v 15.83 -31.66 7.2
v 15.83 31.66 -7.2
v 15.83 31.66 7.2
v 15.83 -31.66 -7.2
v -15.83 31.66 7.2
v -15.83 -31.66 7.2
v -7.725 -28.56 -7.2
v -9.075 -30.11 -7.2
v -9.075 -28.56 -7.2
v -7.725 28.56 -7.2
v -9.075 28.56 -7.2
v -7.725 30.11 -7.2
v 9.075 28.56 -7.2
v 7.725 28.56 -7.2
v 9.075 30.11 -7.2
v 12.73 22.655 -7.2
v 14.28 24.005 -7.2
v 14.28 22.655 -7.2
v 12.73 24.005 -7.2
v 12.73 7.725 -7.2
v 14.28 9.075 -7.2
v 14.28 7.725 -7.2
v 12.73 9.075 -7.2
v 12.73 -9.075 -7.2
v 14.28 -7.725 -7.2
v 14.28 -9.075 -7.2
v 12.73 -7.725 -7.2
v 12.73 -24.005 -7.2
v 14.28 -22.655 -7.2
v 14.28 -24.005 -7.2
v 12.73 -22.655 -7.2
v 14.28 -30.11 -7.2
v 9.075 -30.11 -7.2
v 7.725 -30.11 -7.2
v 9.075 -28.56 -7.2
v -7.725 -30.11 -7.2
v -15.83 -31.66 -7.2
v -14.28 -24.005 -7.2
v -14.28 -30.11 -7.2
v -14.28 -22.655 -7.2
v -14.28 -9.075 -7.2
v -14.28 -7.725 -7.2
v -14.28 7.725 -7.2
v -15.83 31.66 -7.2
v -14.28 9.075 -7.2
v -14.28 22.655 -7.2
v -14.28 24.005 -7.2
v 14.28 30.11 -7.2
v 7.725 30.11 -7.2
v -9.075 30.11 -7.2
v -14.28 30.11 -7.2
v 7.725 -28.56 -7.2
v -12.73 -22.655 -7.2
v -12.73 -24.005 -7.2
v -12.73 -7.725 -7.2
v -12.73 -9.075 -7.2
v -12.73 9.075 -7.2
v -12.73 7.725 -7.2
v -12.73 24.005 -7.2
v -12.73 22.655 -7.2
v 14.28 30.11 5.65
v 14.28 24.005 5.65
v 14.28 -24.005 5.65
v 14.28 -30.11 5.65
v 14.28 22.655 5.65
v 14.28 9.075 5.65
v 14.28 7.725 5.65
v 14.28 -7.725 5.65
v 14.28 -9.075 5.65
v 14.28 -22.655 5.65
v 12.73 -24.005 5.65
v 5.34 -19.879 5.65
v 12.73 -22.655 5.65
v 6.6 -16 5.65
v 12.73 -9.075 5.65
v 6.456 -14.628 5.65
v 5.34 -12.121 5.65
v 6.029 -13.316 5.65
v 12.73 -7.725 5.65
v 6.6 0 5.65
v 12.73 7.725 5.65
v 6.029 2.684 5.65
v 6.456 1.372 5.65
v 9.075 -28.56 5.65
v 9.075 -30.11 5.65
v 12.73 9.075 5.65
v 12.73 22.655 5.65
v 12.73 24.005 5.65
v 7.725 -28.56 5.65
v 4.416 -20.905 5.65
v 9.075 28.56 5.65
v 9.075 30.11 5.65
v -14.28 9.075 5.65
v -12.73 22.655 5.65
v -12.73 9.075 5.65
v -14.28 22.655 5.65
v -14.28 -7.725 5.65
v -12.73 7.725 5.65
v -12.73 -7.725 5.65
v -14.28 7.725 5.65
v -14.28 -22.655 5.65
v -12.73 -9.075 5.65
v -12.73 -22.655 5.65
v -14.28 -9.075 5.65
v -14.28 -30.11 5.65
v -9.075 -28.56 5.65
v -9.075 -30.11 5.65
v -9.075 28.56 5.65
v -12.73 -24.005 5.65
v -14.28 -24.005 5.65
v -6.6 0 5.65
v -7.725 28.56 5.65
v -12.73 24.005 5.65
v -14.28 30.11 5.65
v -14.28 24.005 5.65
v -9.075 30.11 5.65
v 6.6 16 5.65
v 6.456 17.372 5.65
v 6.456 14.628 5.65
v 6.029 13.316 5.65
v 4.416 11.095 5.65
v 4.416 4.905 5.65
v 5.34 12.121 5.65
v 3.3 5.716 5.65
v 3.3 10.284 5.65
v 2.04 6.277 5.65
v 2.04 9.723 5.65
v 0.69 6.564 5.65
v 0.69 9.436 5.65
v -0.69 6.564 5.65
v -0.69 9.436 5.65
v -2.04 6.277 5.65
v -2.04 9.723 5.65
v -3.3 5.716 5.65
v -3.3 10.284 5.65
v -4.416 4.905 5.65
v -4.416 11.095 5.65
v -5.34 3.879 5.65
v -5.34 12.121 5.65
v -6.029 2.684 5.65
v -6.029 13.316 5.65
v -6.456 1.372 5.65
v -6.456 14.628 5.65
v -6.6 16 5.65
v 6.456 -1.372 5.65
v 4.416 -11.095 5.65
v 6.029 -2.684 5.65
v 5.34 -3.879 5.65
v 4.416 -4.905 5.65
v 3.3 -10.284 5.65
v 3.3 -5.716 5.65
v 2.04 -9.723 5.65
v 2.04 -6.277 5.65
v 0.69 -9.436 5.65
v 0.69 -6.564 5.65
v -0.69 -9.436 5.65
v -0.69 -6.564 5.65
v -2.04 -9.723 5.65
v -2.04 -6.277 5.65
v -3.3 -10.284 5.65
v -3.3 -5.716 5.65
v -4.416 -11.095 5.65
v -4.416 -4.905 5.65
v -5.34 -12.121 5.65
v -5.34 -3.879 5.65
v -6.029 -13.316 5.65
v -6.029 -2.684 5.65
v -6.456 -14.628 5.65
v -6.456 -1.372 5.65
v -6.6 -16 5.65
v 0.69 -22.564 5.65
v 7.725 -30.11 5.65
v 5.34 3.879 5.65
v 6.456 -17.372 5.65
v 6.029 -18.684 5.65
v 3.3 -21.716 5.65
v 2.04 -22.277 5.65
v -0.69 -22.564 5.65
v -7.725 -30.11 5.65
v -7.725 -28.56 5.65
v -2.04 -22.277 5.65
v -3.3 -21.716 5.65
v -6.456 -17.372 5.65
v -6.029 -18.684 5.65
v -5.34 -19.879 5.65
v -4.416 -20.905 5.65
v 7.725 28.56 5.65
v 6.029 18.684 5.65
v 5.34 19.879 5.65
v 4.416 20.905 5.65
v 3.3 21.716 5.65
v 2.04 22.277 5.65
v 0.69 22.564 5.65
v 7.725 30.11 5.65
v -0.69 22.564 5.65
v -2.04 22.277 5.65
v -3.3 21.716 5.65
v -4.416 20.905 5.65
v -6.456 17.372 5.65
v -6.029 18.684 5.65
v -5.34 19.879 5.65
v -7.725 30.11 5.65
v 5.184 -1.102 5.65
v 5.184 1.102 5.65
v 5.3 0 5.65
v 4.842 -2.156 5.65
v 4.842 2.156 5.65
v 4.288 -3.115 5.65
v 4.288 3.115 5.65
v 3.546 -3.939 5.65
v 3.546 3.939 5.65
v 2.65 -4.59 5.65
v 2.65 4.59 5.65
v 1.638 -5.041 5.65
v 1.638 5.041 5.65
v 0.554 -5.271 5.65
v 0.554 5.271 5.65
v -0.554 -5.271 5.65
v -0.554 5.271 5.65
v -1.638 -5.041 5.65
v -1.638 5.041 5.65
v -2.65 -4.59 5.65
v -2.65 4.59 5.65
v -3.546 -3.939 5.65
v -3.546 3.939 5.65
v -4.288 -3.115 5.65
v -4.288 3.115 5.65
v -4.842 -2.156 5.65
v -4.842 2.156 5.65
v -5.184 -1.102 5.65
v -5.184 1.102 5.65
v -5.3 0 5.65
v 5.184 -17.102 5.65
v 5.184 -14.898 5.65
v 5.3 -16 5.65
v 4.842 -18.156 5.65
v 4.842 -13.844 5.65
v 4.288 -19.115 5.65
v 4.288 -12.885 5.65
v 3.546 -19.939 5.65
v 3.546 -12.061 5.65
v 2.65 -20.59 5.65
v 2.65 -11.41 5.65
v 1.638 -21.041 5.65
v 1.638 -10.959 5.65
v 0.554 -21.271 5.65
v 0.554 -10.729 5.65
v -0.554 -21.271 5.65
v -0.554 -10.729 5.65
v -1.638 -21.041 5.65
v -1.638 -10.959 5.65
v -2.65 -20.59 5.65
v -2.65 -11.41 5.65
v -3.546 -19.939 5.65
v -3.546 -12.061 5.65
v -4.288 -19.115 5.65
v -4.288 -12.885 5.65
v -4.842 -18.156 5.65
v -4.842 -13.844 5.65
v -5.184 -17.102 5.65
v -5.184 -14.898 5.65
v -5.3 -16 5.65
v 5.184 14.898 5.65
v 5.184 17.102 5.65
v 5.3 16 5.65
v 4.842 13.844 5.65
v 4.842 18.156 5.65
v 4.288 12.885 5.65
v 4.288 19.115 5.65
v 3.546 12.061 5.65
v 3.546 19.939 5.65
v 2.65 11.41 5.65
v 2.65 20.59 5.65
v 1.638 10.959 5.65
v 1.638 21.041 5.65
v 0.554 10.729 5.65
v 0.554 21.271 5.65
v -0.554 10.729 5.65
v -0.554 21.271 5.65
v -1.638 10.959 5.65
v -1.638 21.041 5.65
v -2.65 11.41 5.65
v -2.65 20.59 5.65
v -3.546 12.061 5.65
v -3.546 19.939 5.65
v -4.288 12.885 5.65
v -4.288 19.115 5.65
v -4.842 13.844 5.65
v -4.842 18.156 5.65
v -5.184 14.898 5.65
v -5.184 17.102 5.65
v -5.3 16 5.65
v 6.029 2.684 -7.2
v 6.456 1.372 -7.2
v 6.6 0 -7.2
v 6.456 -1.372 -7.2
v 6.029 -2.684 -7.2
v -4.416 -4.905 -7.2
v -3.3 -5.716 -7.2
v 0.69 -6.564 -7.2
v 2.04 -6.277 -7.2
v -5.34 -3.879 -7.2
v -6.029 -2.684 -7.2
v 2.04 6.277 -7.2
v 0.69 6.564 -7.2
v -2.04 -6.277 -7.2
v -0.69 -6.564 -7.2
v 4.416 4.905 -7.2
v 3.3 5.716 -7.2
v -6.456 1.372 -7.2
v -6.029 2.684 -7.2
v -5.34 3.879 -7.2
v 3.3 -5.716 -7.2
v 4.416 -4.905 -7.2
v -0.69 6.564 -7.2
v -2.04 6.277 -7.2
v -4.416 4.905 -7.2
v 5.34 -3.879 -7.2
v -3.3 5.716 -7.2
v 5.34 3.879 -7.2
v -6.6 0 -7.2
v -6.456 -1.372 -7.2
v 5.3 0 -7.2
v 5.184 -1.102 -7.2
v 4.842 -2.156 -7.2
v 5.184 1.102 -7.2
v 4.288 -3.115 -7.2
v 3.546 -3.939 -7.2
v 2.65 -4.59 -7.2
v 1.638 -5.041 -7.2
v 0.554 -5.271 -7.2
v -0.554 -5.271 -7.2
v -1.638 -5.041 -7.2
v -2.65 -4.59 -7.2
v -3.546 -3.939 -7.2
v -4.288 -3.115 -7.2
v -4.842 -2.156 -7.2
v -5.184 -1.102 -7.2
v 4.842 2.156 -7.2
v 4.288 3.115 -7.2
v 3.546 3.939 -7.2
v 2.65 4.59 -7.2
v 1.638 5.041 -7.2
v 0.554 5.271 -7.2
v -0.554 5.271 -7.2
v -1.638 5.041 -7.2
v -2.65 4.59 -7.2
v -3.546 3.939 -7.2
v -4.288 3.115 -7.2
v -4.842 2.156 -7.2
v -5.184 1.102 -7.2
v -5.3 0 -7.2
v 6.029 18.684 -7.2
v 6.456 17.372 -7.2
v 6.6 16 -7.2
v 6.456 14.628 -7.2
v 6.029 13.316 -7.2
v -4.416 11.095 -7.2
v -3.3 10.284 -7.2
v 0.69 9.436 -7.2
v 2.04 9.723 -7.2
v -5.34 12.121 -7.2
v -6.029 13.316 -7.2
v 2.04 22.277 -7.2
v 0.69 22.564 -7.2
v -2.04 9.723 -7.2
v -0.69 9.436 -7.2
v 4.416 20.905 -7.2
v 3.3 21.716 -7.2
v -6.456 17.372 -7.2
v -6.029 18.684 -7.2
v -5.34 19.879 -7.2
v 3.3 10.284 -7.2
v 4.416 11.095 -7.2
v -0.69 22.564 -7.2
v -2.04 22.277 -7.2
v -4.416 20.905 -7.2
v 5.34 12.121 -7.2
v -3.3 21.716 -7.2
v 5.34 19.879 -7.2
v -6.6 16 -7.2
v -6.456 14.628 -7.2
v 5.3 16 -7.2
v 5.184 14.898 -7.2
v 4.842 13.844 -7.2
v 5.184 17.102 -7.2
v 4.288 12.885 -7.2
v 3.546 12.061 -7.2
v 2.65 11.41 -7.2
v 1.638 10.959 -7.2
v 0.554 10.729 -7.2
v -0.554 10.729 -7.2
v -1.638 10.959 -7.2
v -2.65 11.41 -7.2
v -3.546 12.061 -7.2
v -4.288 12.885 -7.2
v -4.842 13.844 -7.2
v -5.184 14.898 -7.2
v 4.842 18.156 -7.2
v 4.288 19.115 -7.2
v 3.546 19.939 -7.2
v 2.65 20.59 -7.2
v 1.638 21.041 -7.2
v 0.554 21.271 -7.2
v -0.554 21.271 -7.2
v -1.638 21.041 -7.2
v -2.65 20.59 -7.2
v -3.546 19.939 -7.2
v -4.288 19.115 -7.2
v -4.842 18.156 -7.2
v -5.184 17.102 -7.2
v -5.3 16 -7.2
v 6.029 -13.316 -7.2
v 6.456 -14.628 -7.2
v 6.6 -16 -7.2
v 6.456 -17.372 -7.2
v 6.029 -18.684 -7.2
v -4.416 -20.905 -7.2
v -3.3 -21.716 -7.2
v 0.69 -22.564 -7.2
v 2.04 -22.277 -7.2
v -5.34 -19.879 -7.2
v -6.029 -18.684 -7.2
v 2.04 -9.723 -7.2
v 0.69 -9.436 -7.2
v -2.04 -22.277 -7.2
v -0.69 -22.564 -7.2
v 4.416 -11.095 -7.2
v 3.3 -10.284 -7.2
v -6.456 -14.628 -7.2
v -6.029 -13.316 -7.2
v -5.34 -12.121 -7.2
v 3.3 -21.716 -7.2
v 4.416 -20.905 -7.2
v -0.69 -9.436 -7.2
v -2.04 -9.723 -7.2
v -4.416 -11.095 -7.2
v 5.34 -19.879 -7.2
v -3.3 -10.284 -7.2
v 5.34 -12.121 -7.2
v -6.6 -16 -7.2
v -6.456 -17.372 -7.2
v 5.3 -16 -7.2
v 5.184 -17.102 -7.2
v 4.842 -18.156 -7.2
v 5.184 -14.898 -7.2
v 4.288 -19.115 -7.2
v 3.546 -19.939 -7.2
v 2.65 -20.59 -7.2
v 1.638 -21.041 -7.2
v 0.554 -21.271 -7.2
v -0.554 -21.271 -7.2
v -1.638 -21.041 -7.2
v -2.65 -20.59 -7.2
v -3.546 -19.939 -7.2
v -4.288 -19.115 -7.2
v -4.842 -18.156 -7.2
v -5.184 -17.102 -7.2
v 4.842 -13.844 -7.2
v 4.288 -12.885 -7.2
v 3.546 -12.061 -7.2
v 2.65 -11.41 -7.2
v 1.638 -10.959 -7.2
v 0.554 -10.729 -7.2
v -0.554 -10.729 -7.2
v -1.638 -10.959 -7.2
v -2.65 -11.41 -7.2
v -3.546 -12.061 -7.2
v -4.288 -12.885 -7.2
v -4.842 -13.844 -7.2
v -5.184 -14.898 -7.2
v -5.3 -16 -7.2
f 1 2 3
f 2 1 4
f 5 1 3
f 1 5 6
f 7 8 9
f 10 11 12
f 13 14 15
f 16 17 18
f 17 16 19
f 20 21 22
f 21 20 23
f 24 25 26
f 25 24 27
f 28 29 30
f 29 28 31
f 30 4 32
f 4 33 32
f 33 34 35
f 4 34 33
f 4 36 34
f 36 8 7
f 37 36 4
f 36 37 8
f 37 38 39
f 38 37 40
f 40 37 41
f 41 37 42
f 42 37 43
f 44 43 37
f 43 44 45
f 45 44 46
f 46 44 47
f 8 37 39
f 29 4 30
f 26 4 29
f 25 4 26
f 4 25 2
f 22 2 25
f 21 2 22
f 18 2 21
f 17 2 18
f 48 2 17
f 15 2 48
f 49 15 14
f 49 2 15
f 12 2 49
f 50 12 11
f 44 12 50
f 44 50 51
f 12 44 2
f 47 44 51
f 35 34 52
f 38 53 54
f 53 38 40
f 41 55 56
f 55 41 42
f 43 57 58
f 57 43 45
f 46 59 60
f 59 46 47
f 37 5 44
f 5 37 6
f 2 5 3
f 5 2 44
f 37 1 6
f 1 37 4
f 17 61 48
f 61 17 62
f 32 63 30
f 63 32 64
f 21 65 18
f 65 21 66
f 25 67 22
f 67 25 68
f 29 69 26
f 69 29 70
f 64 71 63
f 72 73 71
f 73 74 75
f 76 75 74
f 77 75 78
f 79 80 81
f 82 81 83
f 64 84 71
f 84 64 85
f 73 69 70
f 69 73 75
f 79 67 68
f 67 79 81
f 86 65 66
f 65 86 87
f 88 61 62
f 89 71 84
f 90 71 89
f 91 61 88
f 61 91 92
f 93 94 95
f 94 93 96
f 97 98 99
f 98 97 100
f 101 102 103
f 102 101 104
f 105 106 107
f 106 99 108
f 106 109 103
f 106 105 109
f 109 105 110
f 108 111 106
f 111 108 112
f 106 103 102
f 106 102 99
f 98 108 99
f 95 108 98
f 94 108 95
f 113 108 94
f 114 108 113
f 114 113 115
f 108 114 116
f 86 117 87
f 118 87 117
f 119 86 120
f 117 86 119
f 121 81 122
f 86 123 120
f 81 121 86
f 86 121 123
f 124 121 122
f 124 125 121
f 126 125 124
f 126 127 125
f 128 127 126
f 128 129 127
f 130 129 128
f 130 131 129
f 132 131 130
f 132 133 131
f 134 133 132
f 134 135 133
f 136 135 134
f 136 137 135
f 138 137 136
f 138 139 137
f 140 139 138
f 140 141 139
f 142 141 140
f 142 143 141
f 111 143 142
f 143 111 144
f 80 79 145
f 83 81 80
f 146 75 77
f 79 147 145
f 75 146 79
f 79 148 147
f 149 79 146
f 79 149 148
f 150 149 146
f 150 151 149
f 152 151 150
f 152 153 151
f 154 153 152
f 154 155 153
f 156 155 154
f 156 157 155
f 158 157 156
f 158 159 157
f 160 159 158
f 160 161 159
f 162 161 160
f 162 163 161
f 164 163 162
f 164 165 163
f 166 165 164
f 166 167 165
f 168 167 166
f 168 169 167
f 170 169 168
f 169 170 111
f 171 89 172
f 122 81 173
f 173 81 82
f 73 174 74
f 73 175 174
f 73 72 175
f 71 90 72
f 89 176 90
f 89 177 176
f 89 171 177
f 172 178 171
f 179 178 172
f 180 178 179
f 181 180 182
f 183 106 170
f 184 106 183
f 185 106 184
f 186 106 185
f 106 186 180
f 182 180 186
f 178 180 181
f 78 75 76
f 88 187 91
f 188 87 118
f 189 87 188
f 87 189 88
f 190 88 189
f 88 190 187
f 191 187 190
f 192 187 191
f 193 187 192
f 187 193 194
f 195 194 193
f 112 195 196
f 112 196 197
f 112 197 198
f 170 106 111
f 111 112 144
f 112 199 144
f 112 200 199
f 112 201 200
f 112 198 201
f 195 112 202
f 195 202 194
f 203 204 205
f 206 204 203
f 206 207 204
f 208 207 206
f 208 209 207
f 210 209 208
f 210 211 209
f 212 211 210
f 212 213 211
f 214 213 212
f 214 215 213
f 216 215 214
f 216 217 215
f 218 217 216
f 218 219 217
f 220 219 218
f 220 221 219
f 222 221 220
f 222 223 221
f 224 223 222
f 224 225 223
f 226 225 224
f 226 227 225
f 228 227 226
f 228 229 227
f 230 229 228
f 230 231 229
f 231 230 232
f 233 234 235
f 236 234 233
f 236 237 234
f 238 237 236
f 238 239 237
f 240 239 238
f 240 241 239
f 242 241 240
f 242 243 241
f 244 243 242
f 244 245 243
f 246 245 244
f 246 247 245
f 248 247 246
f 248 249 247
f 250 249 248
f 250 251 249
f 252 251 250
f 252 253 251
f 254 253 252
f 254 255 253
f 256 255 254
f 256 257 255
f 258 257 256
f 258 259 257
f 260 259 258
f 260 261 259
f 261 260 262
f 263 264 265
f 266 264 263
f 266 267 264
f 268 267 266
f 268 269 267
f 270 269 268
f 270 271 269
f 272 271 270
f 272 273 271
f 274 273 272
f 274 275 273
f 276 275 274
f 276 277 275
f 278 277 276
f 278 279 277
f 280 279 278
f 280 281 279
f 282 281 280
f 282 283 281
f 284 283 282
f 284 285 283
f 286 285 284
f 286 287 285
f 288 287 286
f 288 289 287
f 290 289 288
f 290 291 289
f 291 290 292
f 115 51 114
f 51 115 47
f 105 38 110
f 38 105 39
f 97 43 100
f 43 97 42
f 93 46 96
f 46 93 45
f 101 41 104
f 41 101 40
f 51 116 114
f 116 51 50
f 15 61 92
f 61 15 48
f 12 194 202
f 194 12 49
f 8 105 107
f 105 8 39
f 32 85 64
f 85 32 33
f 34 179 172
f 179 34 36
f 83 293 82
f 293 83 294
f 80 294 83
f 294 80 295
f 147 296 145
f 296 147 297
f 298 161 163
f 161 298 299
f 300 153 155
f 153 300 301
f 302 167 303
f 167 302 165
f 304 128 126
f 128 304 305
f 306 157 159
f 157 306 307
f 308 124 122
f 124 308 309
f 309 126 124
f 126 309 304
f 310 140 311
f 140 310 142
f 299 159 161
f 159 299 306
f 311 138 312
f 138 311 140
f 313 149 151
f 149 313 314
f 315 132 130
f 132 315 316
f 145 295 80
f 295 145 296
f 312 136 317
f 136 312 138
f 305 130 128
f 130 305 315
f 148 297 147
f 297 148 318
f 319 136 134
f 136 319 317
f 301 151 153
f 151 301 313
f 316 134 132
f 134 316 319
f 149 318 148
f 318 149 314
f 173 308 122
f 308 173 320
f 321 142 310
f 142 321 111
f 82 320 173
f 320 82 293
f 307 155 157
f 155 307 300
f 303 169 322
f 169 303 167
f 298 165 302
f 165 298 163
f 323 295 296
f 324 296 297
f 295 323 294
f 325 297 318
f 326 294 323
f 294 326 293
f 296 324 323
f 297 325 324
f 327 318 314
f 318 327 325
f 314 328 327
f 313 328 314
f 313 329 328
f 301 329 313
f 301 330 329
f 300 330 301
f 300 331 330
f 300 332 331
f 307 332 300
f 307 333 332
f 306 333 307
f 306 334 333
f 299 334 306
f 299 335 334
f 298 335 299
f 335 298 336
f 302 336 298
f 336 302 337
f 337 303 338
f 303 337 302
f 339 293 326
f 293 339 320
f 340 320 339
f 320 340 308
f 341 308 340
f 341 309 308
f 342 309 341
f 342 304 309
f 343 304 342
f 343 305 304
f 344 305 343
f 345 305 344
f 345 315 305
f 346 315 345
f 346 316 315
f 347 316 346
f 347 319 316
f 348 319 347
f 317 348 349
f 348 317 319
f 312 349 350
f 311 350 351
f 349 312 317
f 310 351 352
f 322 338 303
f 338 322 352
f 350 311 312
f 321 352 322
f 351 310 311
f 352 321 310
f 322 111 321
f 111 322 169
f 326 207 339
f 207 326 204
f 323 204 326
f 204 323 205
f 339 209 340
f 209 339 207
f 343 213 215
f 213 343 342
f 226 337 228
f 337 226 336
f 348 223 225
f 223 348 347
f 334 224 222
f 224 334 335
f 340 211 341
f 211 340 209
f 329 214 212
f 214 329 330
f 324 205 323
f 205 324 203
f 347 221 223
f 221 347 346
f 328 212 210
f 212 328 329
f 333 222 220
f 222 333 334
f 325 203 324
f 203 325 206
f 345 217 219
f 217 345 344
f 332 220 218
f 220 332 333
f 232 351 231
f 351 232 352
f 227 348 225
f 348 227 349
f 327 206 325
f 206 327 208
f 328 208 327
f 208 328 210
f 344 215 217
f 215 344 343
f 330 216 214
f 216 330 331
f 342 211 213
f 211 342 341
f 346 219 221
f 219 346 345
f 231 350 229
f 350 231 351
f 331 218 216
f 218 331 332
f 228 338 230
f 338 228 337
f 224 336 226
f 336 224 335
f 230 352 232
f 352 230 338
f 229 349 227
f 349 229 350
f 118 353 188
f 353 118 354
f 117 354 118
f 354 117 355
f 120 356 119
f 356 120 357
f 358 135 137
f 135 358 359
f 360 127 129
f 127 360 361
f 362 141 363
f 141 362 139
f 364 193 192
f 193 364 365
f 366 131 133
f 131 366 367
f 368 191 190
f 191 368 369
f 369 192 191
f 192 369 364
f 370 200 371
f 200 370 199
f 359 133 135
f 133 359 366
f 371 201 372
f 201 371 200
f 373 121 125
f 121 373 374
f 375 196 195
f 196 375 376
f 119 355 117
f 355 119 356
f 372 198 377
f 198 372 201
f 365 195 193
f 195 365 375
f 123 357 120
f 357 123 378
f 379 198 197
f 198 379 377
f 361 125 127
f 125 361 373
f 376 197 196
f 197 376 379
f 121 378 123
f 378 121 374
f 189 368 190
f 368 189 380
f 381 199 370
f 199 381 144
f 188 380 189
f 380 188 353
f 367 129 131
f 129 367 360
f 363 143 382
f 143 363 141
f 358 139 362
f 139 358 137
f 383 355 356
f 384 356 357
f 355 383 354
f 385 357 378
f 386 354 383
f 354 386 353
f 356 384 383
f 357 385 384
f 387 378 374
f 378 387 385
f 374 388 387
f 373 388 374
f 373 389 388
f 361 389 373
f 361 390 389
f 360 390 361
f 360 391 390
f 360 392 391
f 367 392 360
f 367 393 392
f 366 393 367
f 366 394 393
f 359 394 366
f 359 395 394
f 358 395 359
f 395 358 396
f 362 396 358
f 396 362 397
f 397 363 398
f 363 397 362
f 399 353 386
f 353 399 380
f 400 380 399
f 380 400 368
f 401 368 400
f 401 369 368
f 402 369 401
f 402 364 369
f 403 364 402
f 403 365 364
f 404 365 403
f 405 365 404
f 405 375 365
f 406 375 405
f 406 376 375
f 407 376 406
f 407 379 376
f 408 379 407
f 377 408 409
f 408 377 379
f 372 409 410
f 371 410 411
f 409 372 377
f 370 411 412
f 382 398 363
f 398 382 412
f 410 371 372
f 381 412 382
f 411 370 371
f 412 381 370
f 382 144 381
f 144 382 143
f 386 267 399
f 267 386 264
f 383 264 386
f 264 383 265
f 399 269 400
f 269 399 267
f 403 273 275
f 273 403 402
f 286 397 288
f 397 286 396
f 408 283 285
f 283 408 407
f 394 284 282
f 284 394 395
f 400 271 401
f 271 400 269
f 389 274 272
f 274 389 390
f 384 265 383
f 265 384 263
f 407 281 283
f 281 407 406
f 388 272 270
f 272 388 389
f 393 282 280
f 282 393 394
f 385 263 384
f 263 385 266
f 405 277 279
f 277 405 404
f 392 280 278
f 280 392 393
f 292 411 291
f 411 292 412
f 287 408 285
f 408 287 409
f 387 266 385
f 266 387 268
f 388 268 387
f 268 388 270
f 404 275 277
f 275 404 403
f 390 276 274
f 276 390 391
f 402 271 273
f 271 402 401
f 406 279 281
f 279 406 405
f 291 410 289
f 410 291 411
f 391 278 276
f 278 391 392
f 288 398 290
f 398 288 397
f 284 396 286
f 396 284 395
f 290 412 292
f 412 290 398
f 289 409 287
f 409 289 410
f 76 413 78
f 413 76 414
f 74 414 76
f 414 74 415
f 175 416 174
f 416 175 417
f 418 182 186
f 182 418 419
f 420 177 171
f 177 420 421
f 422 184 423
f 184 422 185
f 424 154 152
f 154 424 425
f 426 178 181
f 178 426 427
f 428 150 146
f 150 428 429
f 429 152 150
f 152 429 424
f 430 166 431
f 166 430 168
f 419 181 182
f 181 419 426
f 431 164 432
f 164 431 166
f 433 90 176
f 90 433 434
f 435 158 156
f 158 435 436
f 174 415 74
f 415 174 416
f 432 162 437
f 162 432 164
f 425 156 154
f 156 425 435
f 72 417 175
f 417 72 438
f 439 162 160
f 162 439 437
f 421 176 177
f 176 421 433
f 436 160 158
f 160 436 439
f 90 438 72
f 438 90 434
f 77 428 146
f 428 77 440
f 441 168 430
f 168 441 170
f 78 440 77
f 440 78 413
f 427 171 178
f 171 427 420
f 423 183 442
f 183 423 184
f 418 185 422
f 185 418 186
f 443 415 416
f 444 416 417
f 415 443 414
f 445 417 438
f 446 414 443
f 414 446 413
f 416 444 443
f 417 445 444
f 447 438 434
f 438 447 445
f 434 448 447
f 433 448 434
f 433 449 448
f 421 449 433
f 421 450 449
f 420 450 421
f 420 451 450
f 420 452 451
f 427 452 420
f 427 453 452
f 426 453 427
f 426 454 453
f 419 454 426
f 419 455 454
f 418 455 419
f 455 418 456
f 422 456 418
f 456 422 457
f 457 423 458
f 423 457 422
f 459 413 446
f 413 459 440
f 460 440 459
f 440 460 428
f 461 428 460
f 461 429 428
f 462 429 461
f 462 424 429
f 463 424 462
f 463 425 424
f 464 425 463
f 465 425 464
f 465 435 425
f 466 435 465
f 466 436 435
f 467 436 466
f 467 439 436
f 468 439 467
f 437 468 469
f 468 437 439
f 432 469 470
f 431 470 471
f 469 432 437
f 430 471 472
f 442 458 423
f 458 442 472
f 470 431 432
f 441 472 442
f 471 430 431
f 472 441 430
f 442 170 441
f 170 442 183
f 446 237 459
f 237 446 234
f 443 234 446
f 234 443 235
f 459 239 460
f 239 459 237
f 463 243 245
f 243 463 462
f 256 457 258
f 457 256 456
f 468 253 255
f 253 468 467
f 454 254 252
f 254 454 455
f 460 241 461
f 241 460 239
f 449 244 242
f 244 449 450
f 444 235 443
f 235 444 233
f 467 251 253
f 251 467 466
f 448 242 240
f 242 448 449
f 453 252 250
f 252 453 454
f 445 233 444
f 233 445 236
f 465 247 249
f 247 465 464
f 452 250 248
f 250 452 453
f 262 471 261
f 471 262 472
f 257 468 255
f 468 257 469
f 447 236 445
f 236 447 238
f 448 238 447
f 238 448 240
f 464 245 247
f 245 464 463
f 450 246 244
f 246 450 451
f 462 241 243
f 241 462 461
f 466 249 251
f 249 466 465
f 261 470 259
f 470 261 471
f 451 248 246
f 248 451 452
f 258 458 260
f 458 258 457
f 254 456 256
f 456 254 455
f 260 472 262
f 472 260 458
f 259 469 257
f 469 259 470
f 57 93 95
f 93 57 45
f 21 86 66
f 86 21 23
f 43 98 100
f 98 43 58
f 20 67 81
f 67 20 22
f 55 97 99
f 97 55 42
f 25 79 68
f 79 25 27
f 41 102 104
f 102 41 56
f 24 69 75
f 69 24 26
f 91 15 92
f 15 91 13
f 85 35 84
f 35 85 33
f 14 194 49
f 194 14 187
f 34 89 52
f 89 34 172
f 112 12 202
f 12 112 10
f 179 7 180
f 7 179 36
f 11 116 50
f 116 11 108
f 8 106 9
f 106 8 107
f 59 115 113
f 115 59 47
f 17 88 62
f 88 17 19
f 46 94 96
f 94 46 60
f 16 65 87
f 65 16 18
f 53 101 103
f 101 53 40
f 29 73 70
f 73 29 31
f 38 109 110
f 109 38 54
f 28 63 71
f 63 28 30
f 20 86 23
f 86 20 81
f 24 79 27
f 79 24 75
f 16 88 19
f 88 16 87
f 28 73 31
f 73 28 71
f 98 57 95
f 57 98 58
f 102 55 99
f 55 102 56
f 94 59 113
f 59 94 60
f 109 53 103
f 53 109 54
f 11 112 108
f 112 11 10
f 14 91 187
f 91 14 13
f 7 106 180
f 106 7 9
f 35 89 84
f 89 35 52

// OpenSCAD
//the duplo itself
// parameters are: 
// width: 1 =standard 4x4 duplo with.
// length: 1= standard 4x4 duplo length
// height: 1= minimal duplo height
// nibbles: true or false
 
duplo(1,2,1.5,false);


module duplo(width,length,height,nibbles) 
{
	//size definitions
	
	ns = 8.4;  //nibble start offset
	no = 6.53; //nibbleoffset
	nbo = 16; // nibble bottom offset
	
	duplowidth = 31.66;
	duplolength=31.66;
	duploheight=9.6;
	duplowall = 1.55;	
	
	
	//the cube
	difference() {
		cube([width*duplowidth,length*duplolength,height*duploheight],true);
		translate([0,0,-duplowall]) 	
			cube([width*duplowidth - 2*duplowall,length*duplolength-2*duplowall,height*duploheight],true);
	}

	//nibbles on top
         if  (nibbles)
     	   {
	    	for(j=[1:length])
		{
			for (i = [1:width])
			{
				translate([i*ns+(i-1)*no,j*ns+(j-1)*no,6.9+(height-1)*duploheight/2]) duplonibble();
				translate([i*-ns+(i-1)*-no,j*ns+(j-1)*no,6.9+(height-1)*duploheight/2]) duplonibble();
				translate([i*ns+(i-1)*no,j*-ns+(j-1)*-no,6.9+(height-1)*duploheight/2]) duplonibble();
				translate([i*-ns+(i-1)*-no,j*-ns+(j-1)*-no,6.9+(height-1)*duploheight/2]) duplonibble();
			}
		}
	        }

	//nibble bottom
	for(j=[1:length])
	{
		for (i = [1:width])
		{
			translate([(i-1)*nbo,(j-1)*nbo,0]) duplobottomnibble(height*duploheight);
			translate([(i-1)*-nbo,(j-1)*-nbo,0]) duplobottomnibble(height*duploheight);
			translate([(i-1)*-nbo,(j-1)*nbo,0]) duplobottomnibble(height*duploheight);
			translate([(i-1)*nbo,(j-1)*-nbo,0]) duplobottomnibble(height*duploheight);
		}
	}
	//little walls inside
	difference() 
	{
		union()
	 	{
			for(j=[1:length])
			{	
				for (i = [1:width])
				{
					translate([0,j*ns+(j-1)*no,0 ]) cube([width*duplowidth,1.35,height*duploheight],true);
					translate([0,j*-ns+(j-1)*-no,0 ]) cube([width*duplowidth,1.35,height*duploheight],true);
					translate([i*ns+(i-1)*no,0,0 ]) cube([1.35,length*duplolength,,height*duploheight],true);
					translate([i*-ns+(i-1)*-no,0,0 ]) cube([1.35,length*duplolength,height*duploheight],true);
				}
			}
		}
		cube([width*duplowidth - 4*duplowall,length*duplolength-4*duplowall,height*duploheight+2],true);
	}
}


module duplonibble()
{
	difference() {
		cylinder(r=4.7,h=4.5,center=true,$fs = 0.01);
		cylinder(r=3.4,h=5.5,center=true,$fs = 0.01);
	}
}

module duplobottomnibble(height)
{
	difference() {
		cylinder(r=6.6,h=height,center=true,$fs = 0.01);
		cylinder(r=5.3,h=height+1,center=true,$fs = 0.01);
	}

}
